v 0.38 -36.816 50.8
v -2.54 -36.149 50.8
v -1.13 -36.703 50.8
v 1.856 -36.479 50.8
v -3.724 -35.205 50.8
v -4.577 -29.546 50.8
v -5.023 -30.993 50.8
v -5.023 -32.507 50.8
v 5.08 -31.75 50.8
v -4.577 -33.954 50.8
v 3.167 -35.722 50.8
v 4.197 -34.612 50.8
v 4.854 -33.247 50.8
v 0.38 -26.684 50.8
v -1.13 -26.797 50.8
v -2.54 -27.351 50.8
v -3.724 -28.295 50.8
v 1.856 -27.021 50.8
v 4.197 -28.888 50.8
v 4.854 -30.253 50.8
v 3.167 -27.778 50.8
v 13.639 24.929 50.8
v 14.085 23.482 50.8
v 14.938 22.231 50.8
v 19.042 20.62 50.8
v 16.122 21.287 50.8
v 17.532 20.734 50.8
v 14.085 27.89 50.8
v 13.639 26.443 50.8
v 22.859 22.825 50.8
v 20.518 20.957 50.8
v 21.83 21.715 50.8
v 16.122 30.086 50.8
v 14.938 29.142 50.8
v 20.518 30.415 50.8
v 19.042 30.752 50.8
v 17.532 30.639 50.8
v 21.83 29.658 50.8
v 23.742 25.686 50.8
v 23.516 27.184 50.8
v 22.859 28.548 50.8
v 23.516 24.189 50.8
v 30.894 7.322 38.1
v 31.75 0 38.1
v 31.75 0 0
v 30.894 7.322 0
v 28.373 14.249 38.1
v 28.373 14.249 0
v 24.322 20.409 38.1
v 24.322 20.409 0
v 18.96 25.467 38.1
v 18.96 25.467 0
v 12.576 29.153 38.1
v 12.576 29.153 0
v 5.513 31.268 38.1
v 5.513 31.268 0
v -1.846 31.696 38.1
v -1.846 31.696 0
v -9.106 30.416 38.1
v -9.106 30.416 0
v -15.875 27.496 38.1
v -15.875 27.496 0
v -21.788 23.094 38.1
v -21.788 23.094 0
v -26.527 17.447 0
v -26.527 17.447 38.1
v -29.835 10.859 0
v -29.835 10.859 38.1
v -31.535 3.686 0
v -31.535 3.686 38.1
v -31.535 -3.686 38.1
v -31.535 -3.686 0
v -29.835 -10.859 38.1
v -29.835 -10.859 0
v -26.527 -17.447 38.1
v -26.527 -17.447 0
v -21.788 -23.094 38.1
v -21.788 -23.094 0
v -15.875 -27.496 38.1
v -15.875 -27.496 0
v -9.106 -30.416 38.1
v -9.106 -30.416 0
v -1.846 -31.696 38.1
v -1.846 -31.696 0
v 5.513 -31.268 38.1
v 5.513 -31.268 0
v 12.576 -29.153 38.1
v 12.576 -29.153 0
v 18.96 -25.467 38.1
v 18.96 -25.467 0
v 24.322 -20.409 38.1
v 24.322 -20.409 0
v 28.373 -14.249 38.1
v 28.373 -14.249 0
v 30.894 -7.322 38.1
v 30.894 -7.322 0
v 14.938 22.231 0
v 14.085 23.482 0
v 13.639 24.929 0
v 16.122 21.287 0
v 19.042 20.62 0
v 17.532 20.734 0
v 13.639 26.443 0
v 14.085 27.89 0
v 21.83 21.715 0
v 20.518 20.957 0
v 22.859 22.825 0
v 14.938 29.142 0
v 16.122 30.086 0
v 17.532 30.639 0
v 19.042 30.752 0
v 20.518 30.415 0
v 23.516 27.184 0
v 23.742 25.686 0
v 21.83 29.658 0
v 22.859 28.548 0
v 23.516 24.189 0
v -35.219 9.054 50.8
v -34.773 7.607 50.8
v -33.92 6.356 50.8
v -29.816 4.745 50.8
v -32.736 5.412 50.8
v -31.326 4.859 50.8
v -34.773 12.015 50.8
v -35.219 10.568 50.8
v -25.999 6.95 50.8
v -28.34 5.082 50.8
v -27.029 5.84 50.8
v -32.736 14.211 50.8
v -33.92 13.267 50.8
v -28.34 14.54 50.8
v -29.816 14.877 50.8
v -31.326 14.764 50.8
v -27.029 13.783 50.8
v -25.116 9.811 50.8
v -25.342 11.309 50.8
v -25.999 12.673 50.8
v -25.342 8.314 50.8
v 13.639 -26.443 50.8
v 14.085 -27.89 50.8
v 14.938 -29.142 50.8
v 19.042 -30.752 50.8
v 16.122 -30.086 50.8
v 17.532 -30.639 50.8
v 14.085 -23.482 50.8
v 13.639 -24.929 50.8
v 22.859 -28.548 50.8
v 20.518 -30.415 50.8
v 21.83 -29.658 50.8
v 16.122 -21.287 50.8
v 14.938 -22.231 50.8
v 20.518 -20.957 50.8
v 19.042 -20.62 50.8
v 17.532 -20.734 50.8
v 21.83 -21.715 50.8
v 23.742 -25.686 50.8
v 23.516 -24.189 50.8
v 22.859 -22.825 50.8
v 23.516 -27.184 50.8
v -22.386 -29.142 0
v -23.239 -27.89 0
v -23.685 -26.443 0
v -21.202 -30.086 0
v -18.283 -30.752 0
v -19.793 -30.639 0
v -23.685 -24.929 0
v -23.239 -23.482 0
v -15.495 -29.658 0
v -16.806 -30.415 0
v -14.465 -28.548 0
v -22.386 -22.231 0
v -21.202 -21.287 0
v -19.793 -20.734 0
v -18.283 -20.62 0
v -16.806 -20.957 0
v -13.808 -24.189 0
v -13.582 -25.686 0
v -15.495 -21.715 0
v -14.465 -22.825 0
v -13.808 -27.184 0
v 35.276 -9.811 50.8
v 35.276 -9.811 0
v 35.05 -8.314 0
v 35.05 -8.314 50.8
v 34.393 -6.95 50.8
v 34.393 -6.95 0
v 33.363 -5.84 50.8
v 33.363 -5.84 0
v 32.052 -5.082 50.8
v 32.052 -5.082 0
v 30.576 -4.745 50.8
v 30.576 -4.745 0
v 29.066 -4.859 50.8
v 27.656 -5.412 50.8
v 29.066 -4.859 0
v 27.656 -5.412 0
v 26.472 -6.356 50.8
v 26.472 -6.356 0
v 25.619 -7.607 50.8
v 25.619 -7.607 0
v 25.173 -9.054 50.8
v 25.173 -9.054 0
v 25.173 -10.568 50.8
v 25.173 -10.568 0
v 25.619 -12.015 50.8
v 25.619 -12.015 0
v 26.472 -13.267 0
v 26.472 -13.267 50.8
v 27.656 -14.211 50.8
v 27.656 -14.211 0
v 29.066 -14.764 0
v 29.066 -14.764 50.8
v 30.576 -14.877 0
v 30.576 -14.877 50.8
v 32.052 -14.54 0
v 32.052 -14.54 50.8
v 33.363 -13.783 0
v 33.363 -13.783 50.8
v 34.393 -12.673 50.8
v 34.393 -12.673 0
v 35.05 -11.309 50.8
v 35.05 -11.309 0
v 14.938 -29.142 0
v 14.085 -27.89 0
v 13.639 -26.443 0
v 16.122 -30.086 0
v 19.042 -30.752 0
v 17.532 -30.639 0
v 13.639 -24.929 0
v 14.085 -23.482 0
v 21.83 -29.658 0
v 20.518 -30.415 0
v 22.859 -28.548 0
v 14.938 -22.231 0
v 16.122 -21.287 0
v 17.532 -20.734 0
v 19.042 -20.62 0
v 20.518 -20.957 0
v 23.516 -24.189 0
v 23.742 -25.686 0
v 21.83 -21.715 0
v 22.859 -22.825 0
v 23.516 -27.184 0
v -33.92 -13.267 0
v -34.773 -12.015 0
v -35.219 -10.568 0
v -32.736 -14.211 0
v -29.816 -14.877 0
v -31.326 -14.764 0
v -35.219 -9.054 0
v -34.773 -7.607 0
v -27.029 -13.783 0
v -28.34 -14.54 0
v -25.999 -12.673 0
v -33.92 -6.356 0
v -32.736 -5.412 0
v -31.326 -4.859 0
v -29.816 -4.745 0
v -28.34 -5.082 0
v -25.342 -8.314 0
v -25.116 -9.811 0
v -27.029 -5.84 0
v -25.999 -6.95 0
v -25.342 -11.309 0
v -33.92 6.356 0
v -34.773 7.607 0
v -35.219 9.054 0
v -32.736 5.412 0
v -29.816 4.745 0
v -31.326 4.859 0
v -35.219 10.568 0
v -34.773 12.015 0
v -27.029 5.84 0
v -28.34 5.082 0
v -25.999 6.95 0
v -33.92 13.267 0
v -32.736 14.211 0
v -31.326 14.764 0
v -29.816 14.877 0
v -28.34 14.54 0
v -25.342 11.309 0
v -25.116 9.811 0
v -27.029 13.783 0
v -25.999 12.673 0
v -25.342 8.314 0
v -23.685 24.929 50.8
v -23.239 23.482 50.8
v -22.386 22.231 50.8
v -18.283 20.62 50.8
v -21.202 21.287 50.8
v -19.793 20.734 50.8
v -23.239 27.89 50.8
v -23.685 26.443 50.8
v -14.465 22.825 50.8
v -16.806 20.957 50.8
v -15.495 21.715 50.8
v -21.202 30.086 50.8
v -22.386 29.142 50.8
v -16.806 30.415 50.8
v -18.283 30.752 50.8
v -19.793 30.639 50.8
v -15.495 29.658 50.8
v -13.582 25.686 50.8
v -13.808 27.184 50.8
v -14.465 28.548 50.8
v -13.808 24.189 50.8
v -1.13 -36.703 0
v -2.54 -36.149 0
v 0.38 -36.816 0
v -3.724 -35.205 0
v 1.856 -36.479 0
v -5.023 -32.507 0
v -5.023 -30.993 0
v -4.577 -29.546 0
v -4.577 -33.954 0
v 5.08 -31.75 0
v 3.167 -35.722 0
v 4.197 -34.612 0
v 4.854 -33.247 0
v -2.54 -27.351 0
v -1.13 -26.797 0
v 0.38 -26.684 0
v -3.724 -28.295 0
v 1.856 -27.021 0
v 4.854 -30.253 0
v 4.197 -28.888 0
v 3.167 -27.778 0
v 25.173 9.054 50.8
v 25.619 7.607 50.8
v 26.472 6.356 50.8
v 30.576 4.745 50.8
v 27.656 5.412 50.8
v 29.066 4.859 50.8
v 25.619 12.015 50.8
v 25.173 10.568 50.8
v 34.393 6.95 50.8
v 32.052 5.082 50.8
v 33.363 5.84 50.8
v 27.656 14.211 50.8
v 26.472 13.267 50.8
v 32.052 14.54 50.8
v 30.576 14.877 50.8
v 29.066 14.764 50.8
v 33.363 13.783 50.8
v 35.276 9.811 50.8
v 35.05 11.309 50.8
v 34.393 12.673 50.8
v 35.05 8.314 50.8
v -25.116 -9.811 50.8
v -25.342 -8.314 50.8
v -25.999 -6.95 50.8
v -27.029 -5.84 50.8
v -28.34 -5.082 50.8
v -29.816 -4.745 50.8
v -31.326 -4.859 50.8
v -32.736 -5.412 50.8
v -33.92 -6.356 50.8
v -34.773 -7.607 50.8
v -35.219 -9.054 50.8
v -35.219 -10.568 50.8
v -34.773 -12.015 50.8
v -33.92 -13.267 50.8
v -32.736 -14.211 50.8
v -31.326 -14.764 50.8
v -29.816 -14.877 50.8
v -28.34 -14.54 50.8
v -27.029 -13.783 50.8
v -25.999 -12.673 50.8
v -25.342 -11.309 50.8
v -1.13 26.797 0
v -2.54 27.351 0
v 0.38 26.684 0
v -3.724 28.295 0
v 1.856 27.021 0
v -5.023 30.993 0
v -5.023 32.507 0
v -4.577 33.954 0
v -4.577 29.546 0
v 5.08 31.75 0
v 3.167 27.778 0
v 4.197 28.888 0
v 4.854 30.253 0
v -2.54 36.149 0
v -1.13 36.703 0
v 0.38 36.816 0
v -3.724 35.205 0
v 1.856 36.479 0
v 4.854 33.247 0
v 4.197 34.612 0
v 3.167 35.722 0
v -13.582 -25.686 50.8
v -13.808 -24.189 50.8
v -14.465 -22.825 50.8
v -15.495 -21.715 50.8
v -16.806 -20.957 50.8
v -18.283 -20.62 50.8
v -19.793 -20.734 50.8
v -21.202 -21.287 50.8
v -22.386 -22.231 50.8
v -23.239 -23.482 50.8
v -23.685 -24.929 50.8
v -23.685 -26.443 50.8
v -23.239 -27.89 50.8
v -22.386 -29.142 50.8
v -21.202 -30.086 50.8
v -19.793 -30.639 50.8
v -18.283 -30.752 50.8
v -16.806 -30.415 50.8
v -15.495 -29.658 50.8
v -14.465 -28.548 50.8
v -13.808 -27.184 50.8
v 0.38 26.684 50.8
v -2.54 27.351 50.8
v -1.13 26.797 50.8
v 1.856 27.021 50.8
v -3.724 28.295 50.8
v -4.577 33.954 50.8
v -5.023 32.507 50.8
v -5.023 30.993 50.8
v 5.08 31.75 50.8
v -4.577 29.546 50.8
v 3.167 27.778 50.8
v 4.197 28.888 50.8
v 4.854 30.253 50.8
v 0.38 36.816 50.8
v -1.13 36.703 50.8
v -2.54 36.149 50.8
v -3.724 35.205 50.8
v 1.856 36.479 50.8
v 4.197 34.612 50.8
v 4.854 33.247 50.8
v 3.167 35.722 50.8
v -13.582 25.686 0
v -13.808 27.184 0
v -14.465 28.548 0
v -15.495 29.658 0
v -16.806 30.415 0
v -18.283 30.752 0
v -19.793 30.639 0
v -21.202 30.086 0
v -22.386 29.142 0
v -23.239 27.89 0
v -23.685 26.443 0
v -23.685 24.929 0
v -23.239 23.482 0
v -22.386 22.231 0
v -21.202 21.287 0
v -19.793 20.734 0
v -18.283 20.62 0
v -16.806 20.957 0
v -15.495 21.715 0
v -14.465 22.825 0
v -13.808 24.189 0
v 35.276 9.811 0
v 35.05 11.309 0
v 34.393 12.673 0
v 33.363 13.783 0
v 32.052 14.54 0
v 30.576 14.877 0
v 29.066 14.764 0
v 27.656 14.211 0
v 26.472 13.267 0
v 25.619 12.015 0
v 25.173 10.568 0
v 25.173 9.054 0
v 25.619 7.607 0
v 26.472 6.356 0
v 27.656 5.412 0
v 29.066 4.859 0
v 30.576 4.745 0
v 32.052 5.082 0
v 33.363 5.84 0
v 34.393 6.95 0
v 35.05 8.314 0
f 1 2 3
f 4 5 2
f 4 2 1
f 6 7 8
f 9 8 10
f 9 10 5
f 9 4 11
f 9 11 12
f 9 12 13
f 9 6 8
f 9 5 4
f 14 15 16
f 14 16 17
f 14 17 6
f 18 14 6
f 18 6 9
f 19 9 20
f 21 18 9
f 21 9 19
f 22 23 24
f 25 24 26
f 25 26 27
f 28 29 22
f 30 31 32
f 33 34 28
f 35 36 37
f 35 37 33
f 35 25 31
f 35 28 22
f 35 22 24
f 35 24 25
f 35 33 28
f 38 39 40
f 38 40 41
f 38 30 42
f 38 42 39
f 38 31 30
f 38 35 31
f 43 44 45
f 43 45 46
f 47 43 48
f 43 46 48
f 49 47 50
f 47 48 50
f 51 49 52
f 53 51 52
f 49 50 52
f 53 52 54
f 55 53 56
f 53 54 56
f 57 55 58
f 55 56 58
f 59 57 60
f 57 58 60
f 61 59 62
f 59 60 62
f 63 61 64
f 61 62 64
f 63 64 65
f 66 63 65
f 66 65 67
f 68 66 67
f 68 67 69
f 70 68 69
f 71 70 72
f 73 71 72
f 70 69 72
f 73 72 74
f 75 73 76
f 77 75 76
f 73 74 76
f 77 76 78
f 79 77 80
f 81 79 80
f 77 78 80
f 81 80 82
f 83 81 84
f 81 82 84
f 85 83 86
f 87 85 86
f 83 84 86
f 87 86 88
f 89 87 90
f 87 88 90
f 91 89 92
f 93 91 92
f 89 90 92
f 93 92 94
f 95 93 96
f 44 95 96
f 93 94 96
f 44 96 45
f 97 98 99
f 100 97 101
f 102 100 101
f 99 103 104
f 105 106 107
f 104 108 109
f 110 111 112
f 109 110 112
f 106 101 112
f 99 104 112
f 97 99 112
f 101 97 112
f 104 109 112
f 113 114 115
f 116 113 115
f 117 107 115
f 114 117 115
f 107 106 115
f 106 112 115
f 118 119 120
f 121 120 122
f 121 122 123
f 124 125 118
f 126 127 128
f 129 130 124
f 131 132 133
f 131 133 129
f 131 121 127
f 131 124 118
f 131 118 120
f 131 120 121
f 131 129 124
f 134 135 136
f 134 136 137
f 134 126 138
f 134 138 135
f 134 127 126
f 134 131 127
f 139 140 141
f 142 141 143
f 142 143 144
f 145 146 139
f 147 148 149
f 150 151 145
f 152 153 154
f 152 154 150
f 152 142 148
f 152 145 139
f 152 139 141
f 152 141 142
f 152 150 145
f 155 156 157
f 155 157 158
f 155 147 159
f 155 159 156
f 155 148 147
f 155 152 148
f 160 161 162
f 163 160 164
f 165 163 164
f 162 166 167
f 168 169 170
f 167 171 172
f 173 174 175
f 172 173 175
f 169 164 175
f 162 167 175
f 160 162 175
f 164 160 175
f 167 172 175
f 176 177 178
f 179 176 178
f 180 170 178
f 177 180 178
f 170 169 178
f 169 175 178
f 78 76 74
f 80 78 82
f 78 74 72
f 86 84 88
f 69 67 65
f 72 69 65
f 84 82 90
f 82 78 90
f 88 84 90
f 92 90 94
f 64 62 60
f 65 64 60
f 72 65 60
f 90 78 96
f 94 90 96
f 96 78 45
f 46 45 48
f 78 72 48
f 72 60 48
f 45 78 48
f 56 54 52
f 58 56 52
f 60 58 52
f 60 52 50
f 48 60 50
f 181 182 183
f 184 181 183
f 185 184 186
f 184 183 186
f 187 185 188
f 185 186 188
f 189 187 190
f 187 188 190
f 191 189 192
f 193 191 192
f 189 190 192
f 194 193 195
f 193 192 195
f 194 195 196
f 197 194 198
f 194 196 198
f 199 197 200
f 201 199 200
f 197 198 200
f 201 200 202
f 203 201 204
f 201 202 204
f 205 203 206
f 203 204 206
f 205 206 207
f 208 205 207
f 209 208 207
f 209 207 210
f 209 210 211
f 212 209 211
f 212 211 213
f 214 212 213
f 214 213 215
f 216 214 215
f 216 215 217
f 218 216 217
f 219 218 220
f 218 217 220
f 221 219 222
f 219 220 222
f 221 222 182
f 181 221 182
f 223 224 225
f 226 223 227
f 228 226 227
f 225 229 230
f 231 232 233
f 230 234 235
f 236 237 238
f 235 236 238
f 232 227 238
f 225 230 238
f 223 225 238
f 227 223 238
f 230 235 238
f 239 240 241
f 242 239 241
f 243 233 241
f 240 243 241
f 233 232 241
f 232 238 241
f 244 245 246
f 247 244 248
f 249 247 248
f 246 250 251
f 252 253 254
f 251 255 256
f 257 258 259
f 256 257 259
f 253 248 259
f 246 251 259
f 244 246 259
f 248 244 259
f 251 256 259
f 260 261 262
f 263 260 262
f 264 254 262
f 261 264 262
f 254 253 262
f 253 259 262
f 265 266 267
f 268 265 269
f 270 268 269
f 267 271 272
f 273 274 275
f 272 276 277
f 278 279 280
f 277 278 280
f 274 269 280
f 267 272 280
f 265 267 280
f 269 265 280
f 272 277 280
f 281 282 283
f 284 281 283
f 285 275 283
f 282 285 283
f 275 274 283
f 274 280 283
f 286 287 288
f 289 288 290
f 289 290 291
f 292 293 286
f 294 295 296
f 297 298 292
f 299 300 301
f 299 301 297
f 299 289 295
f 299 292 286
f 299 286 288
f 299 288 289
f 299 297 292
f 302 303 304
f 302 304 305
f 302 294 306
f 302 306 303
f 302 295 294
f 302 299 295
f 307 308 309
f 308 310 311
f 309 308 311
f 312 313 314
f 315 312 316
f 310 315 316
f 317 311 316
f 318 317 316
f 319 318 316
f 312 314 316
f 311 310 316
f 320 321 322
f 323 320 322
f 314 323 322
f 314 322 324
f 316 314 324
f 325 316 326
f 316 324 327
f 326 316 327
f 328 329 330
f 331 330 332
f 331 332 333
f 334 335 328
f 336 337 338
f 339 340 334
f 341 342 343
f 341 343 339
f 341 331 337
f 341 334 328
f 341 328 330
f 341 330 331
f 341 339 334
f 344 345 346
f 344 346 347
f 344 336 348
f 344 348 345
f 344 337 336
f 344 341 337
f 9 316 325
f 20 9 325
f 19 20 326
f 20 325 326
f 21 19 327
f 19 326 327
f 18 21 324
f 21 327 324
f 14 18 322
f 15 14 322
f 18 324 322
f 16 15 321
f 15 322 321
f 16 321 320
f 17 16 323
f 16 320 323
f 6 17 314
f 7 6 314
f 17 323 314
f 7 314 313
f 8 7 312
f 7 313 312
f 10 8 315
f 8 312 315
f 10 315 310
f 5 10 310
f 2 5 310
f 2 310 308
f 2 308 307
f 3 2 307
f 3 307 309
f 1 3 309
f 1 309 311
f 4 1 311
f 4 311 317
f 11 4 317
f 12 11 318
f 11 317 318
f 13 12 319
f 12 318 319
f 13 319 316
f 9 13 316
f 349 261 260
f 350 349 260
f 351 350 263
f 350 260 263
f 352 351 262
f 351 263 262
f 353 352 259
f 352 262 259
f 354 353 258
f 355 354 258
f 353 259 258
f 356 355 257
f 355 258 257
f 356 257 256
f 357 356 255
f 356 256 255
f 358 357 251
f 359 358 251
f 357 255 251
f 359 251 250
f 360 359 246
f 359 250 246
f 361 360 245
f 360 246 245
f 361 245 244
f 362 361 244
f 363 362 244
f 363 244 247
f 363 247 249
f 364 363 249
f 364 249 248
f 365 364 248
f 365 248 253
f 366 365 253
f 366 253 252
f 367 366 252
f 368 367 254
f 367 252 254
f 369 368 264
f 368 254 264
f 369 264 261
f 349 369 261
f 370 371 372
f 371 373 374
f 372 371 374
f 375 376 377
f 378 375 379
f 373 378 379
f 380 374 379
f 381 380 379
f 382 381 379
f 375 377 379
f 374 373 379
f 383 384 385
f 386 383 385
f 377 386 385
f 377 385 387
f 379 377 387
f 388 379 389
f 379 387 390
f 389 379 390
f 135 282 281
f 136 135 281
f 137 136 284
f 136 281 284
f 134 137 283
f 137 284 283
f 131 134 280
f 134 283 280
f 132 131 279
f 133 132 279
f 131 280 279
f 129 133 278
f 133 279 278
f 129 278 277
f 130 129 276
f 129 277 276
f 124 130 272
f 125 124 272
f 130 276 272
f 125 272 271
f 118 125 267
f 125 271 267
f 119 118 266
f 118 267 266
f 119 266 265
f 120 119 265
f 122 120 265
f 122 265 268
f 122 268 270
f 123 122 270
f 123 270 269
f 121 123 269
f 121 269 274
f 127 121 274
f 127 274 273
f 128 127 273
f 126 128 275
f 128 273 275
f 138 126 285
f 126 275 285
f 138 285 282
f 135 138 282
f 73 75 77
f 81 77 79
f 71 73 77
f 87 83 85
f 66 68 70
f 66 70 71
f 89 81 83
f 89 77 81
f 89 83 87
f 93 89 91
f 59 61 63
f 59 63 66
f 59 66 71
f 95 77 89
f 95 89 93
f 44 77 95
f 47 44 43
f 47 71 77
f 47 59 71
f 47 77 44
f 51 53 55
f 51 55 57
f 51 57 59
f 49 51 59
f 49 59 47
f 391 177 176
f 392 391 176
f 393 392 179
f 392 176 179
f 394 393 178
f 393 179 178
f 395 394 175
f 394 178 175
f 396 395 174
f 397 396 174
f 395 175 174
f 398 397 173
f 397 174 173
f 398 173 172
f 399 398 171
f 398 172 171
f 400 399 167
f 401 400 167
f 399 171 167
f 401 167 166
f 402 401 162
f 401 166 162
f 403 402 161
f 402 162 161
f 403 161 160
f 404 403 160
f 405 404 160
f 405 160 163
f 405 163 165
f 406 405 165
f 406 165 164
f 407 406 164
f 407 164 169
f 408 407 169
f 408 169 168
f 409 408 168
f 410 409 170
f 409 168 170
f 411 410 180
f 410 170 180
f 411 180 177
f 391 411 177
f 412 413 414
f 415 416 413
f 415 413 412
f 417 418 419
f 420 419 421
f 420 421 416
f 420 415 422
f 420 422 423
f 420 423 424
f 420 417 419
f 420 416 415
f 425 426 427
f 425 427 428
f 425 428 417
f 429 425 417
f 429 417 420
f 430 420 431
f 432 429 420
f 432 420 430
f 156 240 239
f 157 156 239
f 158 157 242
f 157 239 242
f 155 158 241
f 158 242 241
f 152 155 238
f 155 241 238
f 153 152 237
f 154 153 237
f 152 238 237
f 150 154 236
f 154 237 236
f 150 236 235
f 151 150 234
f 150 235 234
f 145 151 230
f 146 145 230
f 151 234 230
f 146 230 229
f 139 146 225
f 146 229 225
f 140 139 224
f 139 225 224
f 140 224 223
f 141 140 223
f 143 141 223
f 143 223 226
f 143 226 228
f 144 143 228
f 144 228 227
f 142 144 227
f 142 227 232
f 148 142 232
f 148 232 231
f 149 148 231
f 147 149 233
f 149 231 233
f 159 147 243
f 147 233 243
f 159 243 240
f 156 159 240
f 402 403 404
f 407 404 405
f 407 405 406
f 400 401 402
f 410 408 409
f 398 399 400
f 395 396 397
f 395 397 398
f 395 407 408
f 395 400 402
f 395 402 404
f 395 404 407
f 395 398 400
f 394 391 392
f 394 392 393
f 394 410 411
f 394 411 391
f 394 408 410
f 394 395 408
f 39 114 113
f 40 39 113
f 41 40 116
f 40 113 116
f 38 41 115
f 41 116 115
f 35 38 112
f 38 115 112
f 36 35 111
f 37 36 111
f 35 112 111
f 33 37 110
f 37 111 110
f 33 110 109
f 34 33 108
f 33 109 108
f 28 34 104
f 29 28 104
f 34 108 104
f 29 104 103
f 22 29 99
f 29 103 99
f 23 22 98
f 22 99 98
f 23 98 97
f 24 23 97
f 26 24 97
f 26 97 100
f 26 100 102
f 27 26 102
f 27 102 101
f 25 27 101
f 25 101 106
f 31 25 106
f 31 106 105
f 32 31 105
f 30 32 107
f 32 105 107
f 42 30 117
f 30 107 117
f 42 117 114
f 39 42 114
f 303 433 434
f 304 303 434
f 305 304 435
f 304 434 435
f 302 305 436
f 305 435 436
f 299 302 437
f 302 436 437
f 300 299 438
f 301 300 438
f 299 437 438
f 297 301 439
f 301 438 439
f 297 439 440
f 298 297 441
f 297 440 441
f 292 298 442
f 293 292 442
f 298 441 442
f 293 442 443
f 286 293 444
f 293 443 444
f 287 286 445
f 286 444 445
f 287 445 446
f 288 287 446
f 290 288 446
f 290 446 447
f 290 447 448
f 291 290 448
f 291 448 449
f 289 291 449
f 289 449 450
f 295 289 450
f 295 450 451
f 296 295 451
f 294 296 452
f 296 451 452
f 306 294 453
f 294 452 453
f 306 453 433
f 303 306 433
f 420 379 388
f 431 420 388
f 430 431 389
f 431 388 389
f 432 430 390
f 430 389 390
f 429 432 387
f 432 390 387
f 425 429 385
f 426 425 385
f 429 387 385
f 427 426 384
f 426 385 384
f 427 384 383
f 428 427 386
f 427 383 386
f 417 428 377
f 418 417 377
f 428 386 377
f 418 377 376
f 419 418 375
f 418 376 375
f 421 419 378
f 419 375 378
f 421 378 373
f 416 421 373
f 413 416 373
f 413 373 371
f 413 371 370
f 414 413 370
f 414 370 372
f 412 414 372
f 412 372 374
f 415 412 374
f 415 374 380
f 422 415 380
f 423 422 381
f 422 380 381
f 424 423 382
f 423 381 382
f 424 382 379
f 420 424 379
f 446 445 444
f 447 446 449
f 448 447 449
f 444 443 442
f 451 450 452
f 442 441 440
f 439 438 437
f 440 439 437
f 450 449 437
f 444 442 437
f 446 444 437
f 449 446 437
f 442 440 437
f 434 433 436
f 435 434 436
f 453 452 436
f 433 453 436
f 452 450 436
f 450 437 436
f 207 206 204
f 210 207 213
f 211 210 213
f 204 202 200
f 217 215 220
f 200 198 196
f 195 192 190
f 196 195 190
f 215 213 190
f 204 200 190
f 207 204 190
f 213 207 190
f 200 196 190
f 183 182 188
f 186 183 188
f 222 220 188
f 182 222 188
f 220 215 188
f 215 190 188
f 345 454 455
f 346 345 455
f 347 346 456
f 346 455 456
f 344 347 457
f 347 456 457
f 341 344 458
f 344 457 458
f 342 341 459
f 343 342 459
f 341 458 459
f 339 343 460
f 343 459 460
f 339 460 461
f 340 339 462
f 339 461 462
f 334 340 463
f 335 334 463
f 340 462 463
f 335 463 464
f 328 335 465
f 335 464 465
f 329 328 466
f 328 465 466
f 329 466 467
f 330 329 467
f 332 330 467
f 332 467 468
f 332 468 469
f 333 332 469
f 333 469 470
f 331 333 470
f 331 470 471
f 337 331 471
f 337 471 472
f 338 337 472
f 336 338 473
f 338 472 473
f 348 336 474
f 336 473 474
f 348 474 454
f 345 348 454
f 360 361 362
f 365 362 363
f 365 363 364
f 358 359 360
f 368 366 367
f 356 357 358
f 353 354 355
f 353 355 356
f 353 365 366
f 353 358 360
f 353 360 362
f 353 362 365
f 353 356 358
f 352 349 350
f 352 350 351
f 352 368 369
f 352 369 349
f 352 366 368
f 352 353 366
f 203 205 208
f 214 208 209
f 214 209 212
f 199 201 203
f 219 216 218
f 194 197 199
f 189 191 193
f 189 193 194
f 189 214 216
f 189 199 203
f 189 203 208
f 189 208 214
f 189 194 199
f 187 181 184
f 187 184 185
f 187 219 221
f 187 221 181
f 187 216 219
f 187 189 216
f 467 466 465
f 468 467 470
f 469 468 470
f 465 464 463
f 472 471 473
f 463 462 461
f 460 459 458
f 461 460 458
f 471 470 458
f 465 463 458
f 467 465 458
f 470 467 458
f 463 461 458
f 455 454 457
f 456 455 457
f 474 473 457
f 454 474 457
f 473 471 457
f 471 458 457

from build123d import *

# Parameters (mm, degrees)
F0_R     = 31.75
F1_DEPTH = 38.1
F2_R     = 5.08
F3_DEPTH = 50.8


with BuildPart() as f1:
    # F0 (on Top) → F1 (new body)
    with BuildSketch(Plane.XY):
        Circle(F0_R)
    extrude(amount=F1_DEPTH)


with BuildPart() as f3:
    # F2 (on Top) → F3 (new body)
    with BuildSketch(Plane.XY):
        with Locations((0, 31.75)):
            Circle(F2_R)
        with Locations((-18.662182, 25.68629)):
            Circle(F2_R)
        with Locations((-30.196044, 9.81129)):
            Circle(F2_R)
        with Locations((-30.196044, -9.81129)):
            Circle(F2_R)
        with Locations((-18.662182, -25.68629)):
            Circle(F2_R)
        with Locations((0, -31.75)):
            Circle(F2_R)
        with Locations((18.662182, -25.68629)):
            Circle(F2_R)
        with Locations((30.196044, -9.81129)):
            Circle(F2_R)
        with Locations((30.196044, 9.81129)):
            Circle(F2_R)
        with Locations((18.662182, 25.68629)):
            Circle(F2_R)
    extrude(amount=F3_DEPTH)


solid = Compound([f1.part, f3.part])
